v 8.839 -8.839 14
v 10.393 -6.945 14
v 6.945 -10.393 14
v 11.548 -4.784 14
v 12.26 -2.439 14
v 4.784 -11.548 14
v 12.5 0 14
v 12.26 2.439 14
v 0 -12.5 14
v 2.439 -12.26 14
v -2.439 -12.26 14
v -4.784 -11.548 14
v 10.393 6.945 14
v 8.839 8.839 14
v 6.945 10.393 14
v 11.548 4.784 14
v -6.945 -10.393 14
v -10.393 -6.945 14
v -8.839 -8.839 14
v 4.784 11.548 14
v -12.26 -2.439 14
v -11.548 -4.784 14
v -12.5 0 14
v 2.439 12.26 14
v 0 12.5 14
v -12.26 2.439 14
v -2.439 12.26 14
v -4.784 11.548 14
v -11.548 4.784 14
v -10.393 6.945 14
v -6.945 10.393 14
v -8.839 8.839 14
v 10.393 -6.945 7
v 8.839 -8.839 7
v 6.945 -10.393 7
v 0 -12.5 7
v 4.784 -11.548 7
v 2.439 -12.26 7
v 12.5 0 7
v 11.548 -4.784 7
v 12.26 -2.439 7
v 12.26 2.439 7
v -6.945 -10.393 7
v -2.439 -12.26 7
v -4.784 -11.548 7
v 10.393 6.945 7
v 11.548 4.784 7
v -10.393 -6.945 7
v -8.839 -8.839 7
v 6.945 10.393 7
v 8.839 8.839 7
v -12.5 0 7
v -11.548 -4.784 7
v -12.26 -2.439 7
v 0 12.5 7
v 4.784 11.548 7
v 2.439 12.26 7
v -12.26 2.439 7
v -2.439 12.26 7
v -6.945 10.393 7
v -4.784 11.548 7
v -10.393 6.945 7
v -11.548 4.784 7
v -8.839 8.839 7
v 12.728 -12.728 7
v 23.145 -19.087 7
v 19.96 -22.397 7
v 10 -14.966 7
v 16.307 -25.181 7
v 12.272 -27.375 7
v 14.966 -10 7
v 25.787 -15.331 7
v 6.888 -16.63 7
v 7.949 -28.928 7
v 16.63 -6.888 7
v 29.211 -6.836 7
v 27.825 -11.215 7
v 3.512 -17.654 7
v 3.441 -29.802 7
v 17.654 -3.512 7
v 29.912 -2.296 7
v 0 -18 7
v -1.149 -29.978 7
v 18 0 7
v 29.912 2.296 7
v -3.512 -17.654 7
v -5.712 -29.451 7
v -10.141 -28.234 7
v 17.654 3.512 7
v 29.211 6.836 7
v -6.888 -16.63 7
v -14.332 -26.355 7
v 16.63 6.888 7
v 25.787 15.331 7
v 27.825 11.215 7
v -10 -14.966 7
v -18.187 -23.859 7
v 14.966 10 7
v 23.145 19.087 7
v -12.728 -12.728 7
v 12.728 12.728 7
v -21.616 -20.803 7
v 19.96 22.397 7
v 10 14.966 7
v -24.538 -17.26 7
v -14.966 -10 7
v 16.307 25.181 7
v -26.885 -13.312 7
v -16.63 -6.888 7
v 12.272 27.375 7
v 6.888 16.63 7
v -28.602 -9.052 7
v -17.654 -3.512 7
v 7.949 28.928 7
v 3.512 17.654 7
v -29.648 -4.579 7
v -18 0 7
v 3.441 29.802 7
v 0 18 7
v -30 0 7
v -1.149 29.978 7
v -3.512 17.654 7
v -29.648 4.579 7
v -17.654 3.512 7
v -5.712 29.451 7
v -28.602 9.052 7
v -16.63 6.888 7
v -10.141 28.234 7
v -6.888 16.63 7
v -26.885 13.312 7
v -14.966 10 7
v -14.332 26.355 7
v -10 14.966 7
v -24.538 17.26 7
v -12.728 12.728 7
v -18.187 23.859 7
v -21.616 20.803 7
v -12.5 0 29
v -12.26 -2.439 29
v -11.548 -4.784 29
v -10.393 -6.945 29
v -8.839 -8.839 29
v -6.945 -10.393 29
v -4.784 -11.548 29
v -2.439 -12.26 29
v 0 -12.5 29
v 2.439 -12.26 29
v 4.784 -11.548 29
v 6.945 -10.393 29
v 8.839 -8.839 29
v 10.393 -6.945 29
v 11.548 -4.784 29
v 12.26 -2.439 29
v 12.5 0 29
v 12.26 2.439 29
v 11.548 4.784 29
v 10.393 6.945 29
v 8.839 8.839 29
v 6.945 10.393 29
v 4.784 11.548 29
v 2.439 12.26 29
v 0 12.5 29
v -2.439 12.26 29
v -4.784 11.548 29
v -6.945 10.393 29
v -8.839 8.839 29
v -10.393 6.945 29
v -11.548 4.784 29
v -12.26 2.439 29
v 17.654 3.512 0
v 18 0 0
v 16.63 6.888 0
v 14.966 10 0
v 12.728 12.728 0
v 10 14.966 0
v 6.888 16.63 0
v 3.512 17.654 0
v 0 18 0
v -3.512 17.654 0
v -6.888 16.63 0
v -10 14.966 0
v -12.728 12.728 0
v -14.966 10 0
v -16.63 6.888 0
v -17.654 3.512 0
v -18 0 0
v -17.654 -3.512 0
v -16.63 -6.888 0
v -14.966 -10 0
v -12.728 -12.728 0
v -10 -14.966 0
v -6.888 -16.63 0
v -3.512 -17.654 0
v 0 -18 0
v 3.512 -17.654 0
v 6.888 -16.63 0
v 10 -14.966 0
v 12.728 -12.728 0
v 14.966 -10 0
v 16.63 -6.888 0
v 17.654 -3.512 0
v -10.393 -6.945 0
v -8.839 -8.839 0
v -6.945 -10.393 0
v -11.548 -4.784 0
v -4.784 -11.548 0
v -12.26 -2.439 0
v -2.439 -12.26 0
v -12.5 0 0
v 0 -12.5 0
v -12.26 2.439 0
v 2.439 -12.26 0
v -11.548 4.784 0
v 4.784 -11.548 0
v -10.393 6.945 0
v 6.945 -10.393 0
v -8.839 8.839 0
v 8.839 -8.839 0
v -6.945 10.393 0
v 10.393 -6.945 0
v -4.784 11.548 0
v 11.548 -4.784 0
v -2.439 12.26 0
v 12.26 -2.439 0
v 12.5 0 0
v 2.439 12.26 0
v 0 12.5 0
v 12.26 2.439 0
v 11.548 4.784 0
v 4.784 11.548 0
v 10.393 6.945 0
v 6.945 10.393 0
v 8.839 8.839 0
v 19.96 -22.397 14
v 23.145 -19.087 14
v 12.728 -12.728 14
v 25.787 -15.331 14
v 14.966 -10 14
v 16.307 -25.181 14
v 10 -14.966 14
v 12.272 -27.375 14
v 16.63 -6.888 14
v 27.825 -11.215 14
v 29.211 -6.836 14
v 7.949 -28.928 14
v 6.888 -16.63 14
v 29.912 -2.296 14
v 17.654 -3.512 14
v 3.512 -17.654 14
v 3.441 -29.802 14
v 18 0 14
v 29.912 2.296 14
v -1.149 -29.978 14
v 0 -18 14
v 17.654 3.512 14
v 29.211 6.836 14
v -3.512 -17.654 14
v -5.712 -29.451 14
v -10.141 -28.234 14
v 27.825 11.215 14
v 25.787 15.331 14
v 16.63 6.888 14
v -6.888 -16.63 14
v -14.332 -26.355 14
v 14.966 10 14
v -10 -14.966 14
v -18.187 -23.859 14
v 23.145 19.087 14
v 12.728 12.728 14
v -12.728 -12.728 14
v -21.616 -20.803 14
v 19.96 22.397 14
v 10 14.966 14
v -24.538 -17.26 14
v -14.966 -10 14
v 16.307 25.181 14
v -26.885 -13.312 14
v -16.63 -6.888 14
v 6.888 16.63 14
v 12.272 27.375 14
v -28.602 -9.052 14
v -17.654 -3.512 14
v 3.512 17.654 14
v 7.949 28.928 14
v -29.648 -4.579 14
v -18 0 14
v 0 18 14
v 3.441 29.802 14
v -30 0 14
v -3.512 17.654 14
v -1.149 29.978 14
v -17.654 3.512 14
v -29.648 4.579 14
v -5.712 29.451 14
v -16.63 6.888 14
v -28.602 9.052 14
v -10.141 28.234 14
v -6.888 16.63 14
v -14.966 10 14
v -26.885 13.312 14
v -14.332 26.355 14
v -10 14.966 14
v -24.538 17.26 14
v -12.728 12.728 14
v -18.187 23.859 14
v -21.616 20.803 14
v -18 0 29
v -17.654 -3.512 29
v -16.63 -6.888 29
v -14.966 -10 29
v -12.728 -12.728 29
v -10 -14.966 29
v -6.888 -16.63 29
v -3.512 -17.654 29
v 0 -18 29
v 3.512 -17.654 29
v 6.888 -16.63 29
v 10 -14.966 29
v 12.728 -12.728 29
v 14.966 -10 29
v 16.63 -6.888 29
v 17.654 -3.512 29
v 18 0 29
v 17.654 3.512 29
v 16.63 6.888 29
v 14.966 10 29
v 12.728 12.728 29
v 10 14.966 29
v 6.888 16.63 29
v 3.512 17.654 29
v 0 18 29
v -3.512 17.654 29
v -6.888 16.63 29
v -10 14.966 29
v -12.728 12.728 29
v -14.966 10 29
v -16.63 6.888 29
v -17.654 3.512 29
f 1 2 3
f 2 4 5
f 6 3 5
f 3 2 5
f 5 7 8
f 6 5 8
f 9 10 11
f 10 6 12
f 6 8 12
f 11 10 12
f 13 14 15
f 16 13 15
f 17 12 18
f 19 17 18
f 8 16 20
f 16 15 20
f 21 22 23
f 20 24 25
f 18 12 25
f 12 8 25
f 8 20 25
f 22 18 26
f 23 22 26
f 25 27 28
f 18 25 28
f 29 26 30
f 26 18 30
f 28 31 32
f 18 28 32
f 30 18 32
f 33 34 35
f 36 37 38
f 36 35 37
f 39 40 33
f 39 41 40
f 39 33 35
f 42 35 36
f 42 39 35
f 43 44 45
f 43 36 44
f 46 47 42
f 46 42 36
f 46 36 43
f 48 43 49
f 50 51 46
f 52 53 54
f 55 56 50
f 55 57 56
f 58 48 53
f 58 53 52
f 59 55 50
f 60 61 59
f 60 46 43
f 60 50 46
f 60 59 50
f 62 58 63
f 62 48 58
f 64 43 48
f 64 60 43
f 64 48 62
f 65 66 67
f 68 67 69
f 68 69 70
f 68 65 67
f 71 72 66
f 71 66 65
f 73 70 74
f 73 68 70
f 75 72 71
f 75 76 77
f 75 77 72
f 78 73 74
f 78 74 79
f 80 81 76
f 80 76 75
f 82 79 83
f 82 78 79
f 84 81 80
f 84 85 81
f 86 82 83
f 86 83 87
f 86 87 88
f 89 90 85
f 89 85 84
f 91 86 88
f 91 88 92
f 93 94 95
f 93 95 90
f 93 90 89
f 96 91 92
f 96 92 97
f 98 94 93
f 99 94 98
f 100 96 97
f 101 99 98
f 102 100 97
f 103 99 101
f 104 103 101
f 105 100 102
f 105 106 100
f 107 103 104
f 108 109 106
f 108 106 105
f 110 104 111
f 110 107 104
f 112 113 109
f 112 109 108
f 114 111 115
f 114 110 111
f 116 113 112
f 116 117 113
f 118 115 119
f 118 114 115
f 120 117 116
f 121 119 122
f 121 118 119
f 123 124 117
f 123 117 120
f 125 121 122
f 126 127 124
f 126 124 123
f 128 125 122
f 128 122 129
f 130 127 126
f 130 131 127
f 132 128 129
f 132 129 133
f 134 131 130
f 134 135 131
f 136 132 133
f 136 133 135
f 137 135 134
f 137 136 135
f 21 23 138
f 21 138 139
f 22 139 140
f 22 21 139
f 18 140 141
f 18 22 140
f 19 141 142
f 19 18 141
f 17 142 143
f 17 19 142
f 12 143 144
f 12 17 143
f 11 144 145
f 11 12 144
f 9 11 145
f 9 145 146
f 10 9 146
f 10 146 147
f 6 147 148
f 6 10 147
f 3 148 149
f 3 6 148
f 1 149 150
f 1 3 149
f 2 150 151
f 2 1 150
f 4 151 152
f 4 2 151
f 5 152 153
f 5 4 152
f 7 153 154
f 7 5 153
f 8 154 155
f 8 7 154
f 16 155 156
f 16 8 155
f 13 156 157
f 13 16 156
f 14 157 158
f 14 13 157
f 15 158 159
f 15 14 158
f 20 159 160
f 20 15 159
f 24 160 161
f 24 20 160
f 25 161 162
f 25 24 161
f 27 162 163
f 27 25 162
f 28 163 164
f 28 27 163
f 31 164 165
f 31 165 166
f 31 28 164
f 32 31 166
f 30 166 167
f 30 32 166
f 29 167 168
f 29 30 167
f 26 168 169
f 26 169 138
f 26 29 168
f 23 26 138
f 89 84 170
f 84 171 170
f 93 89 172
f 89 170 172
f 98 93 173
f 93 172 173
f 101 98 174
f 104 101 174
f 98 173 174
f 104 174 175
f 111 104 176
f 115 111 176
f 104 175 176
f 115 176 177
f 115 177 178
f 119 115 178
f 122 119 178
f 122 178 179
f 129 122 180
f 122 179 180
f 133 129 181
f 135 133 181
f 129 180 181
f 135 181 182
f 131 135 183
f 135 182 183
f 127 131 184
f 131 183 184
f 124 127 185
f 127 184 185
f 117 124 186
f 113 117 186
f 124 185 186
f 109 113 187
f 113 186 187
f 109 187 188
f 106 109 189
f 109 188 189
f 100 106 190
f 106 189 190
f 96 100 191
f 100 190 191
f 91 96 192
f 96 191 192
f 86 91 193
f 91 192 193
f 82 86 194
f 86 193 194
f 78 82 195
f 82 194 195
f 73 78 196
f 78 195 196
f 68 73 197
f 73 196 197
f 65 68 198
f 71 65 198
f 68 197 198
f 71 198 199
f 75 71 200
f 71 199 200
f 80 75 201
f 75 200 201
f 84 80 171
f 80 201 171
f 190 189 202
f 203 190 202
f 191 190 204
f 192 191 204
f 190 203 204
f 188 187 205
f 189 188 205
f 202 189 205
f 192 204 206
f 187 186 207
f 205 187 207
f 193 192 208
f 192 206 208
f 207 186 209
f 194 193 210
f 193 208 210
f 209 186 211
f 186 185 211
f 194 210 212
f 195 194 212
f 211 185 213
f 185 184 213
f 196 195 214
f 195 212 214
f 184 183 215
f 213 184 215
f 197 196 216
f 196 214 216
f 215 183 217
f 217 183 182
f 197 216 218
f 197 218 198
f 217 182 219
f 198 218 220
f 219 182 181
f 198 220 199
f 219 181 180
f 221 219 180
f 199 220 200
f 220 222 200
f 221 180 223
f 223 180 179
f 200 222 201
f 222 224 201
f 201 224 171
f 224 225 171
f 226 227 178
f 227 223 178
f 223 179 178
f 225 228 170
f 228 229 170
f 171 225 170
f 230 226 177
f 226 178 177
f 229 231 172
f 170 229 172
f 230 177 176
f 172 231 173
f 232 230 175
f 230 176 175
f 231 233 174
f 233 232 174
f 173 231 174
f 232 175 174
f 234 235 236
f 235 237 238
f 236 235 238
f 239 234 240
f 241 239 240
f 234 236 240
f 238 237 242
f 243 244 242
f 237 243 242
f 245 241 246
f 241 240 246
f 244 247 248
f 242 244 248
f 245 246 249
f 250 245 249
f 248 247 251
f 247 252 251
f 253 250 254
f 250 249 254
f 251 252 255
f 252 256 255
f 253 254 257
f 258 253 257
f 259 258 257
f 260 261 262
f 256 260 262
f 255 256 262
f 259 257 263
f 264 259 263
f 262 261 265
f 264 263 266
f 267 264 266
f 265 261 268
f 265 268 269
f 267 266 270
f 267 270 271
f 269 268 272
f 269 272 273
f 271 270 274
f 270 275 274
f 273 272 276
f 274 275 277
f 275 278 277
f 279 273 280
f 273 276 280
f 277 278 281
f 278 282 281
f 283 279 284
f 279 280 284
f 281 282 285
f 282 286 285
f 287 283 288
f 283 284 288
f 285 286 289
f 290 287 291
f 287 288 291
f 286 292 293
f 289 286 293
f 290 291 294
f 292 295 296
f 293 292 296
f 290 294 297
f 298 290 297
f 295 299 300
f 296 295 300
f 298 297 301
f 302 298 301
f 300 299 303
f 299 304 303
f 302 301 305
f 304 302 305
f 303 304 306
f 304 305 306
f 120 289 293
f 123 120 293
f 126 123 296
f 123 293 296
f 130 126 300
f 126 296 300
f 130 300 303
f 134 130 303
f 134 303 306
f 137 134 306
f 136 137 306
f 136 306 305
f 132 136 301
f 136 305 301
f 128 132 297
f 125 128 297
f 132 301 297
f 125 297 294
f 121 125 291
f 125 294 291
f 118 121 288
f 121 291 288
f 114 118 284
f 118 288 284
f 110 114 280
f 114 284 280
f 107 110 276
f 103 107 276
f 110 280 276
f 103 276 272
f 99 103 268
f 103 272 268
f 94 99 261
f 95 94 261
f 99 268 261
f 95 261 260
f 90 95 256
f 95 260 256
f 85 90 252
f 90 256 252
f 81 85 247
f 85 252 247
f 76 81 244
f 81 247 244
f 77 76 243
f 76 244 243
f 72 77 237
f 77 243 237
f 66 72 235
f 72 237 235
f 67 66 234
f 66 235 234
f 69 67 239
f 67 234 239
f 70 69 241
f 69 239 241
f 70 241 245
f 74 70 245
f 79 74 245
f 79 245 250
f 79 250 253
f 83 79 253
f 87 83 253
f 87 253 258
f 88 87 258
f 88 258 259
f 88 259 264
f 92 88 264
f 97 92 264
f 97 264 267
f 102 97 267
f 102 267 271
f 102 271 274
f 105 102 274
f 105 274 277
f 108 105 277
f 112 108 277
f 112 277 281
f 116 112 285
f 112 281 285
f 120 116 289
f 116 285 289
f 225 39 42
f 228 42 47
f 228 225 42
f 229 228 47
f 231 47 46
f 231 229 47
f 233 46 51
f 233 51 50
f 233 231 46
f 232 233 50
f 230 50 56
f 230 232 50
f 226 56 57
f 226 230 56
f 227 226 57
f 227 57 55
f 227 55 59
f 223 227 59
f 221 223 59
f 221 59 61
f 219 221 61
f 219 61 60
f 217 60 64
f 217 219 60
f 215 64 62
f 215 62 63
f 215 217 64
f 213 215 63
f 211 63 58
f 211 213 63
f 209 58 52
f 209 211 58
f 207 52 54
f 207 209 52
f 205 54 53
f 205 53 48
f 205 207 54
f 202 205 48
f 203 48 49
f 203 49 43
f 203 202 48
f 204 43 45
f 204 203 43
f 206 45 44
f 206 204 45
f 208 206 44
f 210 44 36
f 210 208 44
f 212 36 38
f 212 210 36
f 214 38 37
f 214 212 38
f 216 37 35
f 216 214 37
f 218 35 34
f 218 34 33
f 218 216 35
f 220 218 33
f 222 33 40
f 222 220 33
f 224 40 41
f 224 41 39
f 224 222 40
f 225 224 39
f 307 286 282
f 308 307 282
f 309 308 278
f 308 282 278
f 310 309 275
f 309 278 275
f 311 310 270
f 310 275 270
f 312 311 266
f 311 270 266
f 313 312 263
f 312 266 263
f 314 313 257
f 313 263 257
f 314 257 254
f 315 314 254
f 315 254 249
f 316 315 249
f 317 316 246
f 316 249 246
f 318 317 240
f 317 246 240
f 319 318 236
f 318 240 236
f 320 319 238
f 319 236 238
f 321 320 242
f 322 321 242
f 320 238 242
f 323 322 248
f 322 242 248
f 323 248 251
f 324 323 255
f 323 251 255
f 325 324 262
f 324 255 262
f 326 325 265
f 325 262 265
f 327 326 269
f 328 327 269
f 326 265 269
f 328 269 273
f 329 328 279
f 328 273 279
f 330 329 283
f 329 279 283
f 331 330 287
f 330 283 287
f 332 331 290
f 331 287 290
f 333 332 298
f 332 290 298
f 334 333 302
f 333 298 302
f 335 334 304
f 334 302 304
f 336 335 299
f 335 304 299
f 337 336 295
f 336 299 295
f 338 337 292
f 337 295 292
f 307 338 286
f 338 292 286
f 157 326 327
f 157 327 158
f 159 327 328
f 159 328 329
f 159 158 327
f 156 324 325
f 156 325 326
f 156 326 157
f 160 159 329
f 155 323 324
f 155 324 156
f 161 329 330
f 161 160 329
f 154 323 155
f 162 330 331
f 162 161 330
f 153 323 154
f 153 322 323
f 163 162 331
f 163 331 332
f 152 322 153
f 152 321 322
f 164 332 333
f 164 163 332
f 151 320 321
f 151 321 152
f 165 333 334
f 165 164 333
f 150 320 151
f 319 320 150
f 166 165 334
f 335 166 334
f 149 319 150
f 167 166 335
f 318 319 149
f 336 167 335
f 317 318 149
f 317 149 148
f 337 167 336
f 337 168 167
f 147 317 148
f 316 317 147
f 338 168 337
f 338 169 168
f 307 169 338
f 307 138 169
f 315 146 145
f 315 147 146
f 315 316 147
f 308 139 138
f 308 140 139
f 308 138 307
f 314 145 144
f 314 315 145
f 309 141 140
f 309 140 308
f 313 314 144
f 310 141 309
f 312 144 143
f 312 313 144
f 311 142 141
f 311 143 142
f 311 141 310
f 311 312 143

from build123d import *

# Parameters (mm, degrees)
SKETCH_1_R      = 18
SKETCH_1_R_2    = 12.5
EXTRUDE_1_DEPTH = 7
SKETCH_3_R      = 18
SKETCH_3_R_2    = 12.5
EXTRUDE_2_DEPTH = 22
EXTRUDE_START   = -14
SKETCH_4_R      = 30
EXTRUDE_3_DEPTH = 7


with BuildPart() as part:
    # Эскиз1 → Вытянуть1 (new body)
    with BuildSketch(Plane.XY):
        Circle(SKETCH_1_R)
        Circle(SKETCH_1_R_2, mode=Mode.SUBTRACT)
    extrude(amount=EXTRUDE_1_DEPTH)

    # Эскиз3 → Вытянуть2 (add)
    with BuildSketch(Plane.XY.offset(7)):
        with Locations(Location((0, 0, 0), (0, 0, 180))):
            Circle(SKETCH_3_R)
        with Locations(Location((0, 0, 0), (0, 0, 180))):
            Circle(SKETCH_3_R_2, mode=Mode.SUBTRACT)
    extrude(amount=EXTRUDE_2_DEPTH)

    # Эскиз4 → Вытянуть3 (add)
    with BuildSketch(Plane(origin=(0, 0, 0), x_dir=(-1, 0, 0), z_dir=(0, 0, -1)).offset(EXTRUDE_START)):
        Circle(SKETCH_4_R)
    extrude(amount=EXTRUDE_3_DEPTH)


solid = part.part
